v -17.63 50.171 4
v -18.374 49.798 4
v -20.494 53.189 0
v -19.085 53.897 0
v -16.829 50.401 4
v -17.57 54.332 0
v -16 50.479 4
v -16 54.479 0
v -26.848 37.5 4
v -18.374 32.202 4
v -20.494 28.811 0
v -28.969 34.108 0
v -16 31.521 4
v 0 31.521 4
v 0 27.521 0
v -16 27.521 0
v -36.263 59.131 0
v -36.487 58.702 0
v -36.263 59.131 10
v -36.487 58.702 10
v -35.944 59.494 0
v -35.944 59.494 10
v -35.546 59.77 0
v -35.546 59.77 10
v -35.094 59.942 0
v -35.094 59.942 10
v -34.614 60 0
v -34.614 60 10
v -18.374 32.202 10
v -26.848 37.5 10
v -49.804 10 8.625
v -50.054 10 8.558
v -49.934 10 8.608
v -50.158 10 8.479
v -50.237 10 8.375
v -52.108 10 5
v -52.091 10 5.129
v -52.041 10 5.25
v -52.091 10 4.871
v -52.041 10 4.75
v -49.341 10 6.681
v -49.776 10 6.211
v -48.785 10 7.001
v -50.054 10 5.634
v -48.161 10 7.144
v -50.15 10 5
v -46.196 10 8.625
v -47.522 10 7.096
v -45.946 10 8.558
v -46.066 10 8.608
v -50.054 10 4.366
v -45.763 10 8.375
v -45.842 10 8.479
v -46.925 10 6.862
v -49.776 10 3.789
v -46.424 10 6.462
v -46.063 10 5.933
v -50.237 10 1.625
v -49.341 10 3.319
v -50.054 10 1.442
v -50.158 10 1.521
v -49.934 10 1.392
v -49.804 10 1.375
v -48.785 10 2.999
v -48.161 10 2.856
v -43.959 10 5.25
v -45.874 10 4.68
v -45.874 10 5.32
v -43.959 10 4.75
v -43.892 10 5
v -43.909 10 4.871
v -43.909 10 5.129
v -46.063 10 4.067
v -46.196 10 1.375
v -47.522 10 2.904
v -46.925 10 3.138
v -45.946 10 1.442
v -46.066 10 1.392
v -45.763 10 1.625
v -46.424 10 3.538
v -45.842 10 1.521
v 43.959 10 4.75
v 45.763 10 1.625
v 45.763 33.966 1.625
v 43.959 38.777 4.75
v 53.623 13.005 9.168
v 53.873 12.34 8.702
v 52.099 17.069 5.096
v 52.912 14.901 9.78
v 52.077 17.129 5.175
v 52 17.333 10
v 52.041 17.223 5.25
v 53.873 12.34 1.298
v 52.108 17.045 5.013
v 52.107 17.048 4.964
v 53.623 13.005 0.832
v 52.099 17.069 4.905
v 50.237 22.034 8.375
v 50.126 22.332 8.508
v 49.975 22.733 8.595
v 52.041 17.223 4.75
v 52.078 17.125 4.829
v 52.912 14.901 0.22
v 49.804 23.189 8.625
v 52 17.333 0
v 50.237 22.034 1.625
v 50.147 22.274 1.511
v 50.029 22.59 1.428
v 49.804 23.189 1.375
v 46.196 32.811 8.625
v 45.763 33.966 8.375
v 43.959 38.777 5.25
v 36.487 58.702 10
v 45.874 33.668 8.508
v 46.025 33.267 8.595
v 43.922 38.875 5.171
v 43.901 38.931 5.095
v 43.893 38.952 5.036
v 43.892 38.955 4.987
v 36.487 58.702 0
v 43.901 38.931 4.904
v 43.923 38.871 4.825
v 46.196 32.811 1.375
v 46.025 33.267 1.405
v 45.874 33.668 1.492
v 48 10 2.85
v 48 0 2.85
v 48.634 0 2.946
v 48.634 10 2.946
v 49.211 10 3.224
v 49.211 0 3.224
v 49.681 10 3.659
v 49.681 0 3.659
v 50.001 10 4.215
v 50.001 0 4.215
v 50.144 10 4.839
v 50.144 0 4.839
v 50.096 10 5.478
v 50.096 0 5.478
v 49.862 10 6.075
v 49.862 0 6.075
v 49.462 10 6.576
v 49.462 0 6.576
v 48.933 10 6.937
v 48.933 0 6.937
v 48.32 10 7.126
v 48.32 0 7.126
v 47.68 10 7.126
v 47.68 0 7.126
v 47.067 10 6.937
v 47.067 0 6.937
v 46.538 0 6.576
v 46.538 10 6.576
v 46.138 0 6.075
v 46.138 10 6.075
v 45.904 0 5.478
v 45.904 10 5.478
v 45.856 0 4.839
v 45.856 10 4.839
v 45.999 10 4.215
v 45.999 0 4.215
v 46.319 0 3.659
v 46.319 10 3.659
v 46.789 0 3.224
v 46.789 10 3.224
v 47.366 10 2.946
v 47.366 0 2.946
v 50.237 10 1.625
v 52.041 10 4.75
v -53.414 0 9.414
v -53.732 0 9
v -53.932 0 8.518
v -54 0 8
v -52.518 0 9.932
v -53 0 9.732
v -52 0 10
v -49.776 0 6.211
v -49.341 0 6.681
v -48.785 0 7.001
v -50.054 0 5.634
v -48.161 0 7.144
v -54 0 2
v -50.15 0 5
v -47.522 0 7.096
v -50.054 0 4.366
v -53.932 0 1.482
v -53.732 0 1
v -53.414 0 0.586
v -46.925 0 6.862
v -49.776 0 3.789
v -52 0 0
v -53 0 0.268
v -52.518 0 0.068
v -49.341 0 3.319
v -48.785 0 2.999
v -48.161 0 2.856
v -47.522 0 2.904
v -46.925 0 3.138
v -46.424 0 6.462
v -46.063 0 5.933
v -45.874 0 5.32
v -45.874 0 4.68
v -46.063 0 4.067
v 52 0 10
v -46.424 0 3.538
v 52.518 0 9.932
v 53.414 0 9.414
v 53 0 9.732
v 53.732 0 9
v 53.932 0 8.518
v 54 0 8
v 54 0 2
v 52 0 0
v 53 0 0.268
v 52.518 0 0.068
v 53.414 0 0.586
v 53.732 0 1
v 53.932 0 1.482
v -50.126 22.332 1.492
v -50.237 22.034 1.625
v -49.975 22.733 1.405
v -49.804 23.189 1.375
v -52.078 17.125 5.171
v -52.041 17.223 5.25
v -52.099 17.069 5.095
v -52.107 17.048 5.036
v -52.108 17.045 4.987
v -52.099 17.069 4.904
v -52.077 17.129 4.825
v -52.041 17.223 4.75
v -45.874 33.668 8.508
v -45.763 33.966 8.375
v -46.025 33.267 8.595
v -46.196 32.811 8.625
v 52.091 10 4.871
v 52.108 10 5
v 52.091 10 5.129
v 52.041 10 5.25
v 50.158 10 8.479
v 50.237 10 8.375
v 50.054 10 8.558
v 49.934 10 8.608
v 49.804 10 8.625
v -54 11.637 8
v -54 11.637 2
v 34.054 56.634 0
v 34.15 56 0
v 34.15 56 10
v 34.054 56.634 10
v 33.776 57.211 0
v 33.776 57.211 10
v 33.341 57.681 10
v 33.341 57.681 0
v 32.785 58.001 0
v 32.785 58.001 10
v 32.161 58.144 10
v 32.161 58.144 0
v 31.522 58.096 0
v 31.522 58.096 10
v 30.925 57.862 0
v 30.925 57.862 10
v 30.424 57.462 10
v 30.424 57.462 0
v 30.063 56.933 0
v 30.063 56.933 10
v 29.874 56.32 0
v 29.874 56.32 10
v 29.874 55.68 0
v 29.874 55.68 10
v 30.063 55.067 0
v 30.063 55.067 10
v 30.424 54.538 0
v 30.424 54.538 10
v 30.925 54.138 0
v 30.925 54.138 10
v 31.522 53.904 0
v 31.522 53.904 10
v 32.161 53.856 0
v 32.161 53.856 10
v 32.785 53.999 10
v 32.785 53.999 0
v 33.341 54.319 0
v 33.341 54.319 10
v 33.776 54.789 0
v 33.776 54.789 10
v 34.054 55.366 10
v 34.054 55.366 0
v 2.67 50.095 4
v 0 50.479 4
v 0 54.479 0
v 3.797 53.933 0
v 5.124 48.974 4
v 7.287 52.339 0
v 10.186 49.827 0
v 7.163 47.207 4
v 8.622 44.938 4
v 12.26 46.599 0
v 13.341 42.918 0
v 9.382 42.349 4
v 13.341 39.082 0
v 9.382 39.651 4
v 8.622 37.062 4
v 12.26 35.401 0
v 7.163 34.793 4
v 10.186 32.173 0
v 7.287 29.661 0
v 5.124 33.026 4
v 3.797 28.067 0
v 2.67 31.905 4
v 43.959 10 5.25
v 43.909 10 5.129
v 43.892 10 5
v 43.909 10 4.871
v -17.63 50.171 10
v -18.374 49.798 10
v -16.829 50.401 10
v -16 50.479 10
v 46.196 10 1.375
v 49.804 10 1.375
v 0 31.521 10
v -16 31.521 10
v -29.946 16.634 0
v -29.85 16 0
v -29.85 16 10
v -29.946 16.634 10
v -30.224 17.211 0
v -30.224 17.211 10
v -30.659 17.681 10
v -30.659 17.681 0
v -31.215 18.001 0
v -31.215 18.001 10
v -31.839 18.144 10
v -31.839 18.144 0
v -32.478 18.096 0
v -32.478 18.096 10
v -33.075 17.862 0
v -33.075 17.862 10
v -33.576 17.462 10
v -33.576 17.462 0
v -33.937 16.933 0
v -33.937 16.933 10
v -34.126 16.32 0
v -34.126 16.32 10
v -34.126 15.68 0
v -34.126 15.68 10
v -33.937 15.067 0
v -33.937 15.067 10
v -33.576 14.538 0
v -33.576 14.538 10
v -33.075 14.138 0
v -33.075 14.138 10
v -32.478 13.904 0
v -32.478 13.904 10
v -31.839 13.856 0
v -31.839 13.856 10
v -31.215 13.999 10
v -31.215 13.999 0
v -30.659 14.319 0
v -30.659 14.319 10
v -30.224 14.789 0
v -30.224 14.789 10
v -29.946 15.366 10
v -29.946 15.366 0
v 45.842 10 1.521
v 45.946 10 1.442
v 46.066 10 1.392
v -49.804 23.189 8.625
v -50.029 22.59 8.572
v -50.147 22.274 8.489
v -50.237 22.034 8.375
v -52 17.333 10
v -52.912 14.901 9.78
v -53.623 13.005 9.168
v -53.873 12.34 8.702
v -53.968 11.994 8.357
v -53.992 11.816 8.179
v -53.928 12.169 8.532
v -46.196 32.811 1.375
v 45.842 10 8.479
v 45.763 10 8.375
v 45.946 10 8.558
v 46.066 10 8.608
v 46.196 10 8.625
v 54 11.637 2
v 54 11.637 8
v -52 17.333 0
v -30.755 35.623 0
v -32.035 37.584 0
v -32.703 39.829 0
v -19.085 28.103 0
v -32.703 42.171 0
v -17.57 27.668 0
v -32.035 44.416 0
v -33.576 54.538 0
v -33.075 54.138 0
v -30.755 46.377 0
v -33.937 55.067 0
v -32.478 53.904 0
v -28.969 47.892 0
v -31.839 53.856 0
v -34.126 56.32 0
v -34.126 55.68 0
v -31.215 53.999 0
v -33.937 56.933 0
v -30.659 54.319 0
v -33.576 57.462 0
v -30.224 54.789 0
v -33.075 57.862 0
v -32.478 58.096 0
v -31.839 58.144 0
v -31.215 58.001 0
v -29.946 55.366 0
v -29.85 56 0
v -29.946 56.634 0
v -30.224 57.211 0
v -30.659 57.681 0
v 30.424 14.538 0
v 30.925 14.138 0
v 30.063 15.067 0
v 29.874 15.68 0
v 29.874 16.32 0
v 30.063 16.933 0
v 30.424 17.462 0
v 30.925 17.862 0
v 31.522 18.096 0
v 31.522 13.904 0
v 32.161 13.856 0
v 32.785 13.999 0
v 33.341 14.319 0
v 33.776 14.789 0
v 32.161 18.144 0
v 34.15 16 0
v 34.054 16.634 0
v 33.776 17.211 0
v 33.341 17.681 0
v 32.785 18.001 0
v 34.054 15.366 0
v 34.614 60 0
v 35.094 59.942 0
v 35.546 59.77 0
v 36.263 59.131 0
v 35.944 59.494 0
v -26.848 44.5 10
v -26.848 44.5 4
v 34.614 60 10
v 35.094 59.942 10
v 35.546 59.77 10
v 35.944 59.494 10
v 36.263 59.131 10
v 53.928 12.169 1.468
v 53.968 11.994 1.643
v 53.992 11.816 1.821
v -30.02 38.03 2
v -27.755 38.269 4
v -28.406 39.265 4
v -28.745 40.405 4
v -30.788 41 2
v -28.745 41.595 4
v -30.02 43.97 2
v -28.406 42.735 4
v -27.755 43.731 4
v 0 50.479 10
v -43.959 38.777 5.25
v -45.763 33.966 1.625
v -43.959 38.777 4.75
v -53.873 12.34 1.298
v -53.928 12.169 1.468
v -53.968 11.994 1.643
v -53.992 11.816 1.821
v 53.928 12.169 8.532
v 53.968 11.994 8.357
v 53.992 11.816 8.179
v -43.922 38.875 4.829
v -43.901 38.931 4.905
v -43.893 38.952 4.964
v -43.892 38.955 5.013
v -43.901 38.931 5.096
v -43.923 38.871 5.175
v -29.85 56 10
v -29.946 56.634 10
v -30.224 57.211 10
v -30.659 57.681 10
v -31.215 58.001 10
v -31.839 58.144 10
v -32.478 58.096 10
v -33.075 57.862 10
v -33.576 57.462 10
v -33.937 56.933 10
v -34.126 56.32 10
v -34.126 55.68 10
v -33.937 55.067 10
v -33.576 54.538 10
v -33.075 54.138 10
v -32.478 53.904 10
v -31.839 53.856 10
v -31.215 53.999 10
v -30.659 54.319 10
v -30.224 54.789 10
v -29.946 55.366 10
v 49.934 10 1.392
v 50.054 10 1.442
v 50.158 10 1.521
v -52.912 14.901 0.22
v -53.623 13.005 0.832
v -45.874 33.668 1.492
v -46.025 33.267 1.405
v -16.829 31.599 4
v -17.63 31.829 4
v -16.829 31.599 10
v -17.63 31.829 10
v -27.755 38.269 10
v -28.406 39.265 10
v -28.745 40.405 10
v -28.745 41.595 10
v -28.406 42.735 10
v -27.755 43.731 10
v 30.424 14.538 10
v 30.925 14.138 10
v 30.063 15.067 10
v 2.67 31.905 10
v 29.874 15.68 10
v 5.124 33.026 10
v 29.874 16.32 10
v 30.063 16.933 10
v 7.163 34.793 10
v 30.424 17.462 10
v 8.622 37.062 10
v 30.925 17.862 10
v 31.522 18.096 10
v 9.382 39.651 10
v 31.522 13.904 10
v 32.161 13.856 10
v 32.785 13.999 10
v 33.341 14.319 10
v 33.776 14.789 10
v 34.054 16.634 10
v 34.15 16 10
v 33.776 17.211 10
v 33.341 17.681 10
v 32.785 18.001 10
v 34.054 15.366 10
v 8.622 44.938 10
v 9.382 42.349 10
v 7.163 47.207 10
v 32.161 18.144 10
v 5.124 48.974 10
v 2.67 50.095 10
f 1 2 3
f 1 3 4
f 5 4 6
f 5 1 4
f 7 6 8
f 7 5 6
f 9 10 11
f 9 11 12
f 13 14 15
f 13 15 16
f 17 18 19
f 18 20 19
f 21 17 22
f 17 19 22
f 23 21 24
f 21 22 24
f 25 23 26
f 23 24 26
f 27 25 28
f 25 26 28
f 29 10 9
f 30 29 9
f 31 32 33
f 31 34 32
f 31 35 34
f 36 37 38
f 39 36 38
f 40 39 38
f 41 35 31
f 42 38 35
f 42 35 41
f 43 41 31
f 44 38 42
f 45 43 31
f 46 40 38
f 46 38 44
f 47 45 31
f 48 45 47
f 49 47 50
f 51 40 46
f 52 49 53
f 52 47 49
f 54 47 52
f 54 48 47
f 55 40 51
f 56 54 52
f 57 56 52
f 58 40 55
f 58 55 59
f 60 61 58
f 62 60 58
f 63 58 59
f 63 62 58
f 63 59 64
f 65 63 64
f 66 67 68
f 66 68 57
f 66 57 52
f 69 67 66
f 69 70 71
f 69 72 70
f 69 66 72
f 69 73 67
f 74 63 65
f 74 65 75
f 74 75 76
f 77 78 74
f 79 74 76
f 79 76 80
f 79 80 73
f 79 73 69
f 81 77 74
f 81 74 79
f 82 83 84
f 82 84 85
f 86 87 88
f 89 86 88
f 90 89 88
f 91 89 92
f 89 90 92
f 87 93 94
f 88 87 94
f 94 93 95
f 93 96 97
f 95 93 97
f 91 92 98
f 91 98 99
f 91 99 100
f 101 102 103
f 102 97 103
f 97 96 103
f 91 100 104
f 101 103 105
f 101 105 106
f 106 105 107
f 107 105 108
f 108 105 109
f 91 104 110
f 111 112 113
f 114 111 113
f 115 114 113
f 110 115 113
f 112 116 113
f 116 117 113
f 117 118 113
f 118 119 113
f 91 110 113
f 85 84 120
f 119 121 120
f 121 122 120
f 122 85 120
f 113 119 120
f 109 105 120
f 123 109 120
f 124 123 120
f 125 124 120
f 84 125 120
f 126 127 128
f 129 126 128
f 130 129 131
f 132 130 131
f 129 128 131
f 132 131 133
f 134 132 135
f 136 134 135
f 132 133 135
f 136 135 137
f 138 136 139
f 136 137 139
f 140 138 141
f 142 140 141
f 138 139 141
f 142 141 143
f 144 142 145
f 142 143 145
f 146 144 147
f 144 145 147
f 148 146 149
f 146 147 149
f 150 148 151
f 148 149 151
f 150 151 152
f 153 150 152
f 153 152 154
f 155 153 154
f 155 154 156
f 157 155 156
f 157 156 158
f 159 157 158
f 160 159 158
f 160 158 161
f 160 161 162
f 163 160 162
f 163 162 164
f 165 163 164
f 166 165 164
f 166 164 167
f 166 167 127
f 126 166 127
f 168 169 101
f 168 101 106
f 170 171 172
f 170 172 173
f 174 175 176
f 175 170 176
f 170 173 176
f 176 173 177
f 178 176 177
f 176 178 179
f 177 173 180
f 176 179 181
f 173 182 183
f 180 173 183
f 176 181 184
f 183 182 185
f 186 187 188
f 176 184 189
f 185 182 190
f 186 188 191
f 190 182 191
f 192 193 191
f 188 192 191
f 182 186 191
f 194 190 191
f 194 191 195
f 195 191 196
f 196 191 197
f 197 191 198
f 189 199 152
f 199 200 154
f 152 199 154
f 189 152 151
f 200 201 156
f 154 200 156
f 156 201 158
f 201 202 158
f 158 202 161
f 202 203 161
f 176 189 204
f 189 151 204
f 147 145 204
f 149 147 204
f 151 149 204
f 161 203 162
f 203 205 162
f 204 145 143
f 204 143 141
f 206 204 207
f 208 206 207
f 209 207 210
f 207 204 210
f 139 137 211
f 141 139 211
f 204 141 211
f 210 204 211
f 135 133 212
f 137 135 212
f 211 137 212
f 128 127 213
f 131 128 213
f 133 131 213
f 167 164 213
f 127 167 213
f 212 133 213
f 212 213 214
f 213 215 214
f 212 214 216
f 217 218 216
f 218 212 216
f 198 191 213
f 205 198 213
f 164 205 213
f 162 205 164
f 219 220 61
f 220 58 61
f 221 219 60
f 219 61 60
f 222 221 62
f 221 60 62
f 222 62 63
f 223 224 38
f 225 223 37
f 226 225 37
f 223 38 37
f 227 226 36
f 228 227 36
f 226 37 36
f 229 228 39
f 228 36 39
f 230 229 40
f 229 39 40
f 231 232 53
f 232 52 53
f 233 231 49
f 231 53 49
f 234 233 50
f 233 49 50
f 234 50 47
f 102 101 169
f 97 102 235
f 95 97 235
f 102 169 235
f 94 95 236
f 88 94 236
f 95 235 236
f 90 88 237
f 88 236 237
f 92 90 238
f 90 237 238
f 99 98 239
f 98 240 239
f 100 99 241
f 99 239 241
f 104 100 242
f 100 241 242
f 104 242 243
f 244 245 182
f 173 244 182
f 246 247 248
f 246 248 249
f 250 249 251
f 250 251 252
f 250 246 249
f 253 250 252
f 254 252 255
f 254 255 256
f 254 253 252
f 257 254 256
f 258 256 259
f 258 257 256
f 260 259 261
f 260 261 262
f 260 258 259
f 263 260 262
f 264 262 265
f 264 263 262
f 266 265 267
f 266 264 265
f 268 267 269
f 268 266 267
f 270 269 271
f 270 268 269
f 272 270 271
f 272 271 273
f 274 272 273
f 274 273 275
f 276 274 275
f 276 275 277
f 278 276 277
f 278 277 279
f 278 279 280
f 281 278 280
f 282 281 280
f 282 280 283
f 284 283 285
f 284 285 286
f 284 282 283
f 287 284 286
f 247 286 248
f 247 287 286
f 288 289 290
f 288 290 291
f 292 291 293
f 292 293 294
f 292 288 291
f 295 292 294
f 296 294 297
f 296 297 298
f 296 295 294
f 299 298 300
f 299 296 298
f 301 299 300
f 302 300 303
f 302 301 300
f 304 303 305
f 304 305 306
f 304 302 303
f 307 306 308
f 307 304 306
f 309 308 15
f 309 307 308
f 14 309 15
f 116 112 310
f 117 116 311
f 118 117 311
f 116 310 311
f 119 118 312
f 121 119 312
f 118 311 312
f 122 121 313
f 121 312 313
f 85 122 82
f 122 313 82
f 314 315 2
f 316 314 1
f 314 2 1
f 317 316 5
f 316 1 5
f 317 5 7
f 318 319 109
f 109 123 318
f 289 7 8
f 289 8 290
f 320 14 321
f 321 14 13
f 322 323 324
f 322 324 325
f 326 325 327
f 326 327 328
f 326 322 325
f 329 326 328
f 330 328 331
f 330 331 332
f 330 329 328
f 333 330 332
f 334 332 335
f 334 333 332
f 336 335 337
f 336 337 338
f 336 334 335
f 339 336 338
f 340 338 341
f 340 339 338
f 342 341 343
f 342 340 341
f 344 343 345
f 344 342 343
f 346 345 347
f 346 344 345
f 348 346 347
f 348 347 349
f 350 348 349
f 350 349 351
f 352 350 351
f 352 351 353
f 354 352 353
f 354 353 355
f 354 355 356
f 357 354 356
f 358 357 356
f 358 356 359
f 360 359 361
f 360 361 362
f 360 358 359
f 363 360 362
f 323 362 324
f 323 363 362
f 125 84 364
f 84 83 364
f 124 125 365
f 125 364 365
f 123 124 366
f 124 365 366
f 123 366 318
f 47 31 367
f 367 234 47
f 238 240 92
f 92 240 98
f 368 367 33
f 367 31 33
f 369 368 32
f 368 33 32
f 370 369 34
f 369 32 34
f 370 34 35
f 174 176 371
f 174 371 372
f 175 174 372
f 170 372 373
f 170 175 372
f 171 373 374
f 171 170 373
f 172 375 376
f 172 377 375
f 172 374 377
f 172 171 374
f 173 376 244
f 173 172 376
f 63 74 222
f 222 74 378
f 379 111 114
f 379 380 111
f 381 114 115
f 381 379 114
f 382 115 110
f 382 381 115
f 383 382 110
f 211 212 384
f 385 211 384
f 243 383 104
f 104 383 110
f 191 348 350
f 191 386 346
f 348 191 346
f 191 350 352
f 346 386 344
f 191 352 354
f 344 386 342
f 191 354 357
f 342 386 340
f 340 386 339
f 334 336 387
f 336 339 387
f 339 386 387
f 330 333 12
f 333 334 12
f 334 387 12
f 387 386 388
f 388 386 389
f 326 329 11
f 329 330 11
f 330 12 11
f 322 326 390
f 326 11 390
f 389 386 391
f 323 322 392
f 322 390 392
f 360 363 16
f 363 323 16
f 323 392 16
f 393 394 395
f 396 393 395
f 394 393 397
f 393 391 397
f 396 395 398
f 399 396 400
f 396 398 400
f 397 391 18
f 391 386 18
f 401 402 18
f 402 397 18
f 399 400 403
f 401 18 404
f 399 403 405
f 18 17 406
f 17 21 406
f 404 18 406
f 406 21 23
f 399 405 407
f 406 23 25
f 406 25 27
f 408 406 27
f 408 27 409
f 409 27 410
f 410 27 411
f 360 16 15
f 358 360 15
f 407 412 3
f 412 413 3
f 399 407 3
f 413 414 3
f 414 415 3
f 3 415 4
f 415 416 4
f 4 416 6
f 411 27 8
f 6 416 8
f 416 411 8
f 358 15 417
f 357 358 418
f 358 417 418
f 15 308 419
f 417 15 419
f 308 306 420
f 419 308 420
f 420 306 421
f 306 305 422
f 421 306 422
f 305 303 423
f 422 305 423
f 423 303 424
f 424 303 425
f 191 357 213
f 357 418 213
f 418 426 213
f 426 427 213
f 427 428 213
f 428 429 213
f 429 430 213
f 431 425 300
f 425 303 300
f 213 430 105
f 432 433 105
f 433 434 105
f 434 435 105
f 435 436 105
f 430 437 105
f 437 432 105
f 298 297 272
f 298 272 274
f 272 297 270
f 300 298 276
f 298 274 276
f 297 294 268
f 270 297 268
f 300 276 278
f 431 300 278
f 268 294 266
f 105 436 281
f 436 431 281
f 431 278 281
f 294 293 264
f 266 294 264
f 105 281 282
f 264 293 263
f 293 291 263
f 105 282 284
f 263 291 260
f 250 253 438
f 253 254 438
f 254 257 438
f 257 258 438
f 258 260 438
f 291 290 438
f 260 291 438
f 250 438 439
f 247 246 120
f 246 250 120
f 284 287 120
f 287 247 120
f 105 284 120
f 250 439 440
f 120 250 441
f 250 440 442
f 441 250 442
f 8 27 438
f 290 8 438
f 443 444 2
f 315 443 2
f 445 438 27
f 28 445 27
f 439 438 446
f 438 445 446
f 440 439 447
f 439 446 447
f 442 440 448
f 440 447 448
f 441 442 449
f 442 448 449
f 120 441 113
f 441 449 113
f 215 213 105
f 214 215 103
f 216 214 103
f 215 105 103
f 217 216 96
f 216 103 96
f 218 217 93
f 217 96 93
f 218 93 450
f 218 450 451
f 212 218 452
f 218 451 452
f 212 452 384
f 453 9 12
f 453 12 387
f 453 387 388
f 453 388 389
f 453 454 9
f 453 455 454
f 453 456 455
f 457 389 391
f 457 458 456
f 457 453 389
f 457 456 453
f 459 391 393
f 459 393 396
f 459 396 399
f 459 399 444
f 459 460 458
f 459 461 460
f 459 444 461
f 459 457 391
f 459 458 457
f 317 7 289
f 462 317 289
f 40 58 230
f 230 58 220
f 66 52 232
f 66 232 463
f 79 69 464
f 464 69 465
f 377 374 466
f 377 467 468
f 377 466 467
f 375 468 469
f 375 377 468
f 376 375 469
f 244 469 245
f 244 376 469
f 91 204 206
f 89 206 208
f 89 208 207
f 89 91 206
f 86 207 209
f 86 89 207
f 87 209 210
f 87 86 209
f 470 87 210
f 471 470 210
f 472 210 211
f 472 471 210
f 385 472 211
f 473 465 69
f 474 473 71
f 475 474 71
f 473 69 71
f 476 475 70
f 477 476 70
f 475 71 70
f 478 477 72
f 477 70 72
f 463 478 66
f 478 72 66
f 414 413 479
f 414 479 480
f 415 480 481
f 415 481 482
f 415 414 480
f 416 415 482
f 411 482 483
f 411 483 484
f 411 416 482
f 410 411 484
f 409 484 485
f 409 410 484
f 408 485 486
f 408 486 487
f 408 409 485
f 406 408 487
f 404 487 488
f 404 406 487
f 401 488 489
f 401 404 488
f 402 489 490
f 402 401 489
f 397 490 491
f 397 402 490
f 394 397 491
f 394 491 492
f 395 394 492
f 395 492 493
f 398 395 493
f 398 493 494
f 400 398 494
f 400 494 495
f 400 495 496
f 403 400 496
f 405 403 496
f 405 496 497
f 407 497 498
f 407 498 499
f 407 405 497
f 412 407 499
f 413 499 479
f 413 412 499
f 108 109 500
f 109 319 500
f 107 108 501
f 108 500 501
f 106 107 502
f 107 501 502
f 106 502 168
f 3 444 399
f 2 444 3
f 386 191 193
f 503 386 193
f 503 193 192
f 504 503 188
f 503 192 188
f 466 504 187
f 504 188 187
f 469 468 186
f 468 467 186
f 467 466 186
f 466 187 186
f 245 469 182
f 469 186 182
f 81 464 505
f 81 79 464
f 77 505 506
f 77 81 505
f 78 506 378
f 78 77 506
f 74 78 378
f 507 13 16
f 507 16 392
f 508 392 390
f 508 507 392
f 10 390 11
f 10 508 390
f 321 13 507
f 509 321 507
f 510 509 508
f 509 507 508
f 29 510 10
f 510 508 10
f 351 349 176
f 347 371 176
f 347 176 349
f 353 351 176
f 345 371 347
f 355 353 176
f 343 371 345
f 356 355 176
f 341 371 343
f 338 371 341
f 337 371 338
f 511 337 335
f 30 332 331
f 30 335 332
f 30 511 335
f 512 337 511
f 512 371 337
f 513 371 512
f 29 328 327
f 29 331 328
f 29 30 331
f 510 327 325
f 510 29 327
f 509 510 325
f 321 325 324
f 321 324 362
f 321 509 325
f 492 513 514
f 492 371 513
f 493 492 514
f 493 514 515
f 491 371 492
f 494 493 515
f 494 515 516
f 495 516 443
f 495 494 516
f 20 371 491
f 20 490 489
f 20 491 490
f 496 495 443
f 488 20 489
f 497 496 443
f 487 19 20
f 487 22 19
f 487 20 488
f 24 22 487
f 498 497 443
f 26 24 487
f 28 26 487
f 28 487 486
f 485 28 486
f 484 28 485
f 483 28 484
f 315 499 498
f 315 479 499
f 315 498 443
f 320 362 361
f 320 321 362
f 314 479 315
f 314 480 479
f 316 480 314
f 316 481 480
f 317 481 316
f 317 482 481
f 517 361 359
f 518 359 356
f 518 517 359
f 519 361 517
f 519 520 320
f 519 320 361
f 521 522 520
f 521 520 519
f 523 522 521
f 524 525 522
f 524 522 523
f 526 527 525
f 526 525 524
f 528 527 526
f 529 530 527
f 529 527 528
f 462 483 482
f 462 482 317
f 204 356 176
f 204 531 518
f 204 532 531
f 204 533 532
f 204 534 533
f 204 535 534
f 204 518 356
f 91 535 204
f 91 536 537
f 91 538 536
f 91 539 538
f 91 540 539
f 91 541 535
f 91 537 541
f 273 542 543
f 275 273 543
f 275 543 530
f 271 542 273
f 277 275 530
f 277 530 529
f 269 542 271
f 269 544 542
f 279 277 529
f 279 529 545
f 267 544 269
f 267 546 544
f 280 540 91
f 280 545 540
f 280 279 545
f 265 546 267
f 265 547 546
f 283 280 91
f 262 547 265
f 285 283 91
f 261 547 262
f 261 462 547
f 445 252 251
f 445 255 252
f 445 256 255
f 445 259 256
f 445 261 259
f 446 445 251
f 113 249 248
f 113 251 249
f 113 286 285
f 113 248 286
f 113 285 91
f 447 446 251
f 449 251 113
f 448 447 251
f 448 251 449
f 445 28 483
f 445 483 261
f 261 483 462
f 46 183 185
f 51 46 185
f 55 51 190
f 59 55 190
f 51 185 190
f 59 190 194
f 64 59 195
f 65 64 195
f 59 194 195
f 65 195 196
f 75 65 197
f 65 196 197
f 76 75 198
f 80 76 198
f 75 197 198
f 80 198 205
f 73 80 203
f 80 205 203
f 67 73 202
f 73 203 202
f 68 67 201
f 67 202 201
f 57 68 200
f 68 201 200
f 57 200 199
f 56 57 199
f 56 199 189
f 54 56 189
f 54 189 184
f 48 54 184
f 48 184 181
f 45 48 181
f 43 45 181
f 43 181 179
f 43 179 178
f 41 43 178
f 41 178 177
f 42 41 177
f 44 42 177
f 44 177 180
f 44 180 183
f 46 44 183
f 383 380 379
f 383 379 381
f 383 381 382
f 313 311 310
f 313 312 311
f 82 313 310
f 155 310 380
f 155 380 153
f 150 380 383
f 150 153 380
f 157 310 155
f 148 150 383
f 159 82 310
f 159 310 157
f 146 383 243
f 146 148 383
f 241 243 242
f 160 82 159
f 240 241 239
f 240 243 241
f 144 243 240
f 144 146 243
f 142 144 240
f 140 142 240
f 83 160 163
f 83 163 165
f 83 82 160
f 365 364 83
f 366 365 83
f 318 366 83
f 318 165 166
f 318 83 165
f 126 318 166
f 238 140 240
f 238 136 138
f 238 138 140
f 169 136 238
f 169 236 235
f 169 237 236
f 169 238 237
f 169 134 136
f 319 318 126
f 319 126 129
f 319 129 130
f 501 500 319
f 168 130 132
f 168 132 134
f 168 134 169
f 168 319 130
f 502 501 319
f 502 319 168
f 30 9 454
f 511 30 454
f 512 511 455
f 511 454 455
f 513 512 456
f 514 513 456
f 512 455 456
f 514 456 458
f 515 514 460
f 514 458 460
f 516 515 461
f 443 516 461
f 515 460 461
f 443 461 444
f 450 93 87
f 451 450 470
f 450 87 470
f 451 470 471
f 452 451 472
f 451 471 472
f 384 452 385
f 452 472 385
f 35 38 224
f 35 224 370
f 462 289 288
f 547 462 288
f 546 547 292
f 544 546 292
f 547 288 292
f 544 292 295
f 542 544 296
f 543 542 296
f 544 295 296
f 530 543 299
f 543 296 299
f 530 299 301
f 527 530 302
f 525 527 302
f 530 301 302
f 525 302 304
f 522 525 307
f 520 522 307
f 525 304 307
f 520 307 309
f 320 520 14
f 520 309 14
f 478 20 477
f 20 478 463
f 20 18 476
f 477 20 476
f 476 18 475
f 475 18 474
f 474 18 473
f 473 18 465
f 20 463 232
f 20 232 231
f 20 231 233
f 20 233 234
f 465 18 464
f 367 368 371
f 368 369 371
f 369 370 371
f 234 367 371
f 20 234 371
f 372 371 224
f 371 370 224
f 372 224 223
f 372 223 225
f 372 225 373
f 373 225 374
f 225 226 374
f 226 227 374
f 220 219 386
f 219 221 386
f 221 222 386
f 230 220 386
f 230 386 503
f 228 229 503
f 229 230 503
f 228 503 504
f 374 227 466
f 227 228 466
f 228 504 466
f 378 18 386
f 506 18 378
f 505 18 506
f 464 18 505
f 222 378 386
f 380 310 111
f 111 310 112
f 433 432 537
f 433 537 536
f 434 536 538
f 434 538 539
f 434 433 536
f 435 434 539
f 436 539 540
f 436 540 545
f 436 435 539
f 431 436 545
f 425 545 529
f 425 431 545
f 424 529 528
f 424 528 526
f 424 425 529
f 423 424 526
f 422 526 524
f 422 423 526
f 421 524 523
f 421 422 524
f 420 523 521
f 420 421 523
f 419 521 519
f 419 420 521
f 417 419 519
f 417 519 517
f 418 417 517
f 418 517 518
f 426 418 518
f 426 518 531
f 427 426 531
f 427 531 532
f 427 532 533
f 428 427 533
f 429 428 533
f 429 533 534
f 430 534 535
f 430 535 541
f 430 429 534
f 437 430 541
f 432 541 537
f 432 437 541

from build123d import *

# Parameters (mm, degrees)
SKETCH_1_R          = 2.15
EXTRUDE_1_DEPTH     = 10
SKETCH_2_R          = 2.15
CUT_EXTRUDE_1_DEPTH = 82.338797631
CUT_EXTRUDE_2_DEPTH = 50
FILLET_1_R          = 0.5
FILLET_2_R          = 2
SKETCH_4_R          = 9.478521267
SKETCH_4_R_2        = 4.478521267
SKETCH_4_R_3        = 4.1275
CUT_EXTRUDE_3_DEPTH = 82.338797631
CHAMFER_1_SIZE      = 4


with BuildPart() as part:
    # 草图1 → 凸台-拉伸1 (new body)
    with BuildSketch(Plane.XY):
        Polygon((-54, 0), (54, 0), (54, 12), (36, 60), (-36, 60), (-54, 12), align=None)
        with Locations((-32, 56)):
            Circle(SKETCH_1_R, mode=Mode.SUBTRACT)
        with Locations((32, 56)):
            Circle(SKETCH_1_R, mode=Mode.SUBTRACT)
        with Locations((32, 16)):
            Circle(SKETCH_1_R, mode=Mode.SUBTRACT)
        with Locations((-32, 16)):
            Circle(SKETCH_1_R, mode=Mode.SUBTRACT)
    extrude(amount=EXTRUDE_1_DEPTH)

    # 草图2 → 切除-拉伸1 (cut, through all)
    with BuildSketch(Plane.XZ):
        with Locations(Location((48, 5, 0), (0, 0, 270))):
            Circle(SKETCH_2_R)
        with Locations(Location((-48, 5, 0), (0, 0, 180))):
            Circle(SKETCH_2_R)
    extrude(amount=-CUT_EXTRUDE_1_DEPTH, mode=Mode.SUBTRACT)

    # 草图3 → 切除-拉伸2 (cut)
    with BuildSketch(Plane(origin=(0, 60, 0), x_dir=(1, 0, 0), z_dir=(0, 1, 0))):
        Polygon((-43.814210548, -5), (-45.907105274, -1.375), (-50.092894726, -1.375), (-52.185789452, -5), (-50.092894726, -8.625), (-45.907105274, -8.625), align=None)
        Polygon((43.814210548, -5), (45.907105274, -8.625), (50.092894726, -8.625), (52.185789452, -5), (50.092894726, -1.375), (45.907105274, -1.375), align=None)
    extrude(amount=-CUT_EXTRUDE_2_DEPTH, mode=Mode.SUBTRACT)

    # 圆角1
    fillet_1_edges = [part.edges().sort_by_distance(p)[0] for p in [
        (-43.814210548, 24.581052602, 5),
        (-45.907105274, 21.790526301, 8.625),
        (-50.092894726, 16.209473699, 8.625),
        (-52.185789452, 13.418947398, 5),
        (-50.092894726, 16.209473699, 1.375),
        (-45.907105274, 21.790526301, 1.375),
        (43.814210548, 24.581052602, 5),
        (45.907105274, 21.790526301, 1.375),
        (50.092894726, 16.209473699, 1.375),
        (52.185789452, 13.418947398, 5),
        (50.092894726, 16.209473699, 8.625),
        (45.907105274, 21.790526301, 8.625),
    ]]
    fillet(fillet_1_edges, radius=FILLET_1_R)

    # 圆角2
    fillet_2_edges = [part.edges().sort_by_distance(p)[0] for p in [
        (-54, 12, 5),
        (-36, 60, 5),
        (36, 60, 5),
        (54, 12, 5),
        (-54, 6, 10),
        (54, 6, 10),
        (-54, 6, 0),
        (54, 6, 0),
    ]]
    fillet(fillet_2_edges, radius=FILLET_2_R)

    # 草图4 → 切除-拉伸3 (cut, through all)
    with BuildSketch(Plane(origin=(0, 0, 0), x_dir=(-1, 0, 0), z_dir=(0, 0, -1))):
        with Locations((0, 41)):
            Circle(SKETCH_4_R)
        with BuildLine():
            Line((26.84820546, 44.499874972), (18.374024707, 49.797520169))
            ThreePointArc((18.374024707, 49.797520169), (19.917223052, 48.170833089), (20.478521267, 46))
            ThreePointArc((20.478521267, 46), (12.833207242, 42.833207242), (16, 50.478521267))
            Line((16, 50.478521267), (0, 50.478521267))
            ThreePointArc((0, 50.478521267), (6.702326663, 47.702326663), (9.478521267, 41))
            ThreePointArc((9.478521267, 41), (6.702326663, 34.297673337), (0, 31.521478733))
            Line((0, 31.521478733), (16, 31.521478733))
            ThreePointArc((16, 31.521478733), (12.833207242, 39.166792758), (20.478521267, 36))
            ThreePointArc((20.478521267, 36), (19.917223052, 33.829166911), (18.374024707, 32.202479831))
            Line((18.374024707, 32.202479831), (26.84820546, 37.500125028))
            ThreePointArc((26.84820546, 37.500125028), (20.532754038, 41), (26.84820546, 44.499874972))
        make_face()
        with Locations((16, 46)):
            Circle(SKETCH_4_R_2)
        with Locations((16, 36)):
            Circle(SKETCH_4_R_2)
        with Locations((24.660254038, 41)):
            Circle(SKETCH_4_R_3)
    extrude(amount=-CUT_EXTRUDE_3_DEPTH, mode=Mode.SUBTRACT)

    # 倒角1
    chamfer_1_edges = [part.edges().sort_by_distance(p)[0] for p in [
        (-8, 50.478521267, 0),
        (-22.611115084, 47.14869757, 0),
        (9.478521267, 41, 0),
        (-8, 31.521478733, 0),
        (-17.234884185, 31.695094218, 0),
        (-22.611115084, 34.85130243, 0),
        (-28.787754038, 41, 0),
        (-17.234884185, 50.304905782, 0),
    ]]
    chamfer(chamfer_1_edges, length=CHAMFER_1_SIZE)


solid = part.part
